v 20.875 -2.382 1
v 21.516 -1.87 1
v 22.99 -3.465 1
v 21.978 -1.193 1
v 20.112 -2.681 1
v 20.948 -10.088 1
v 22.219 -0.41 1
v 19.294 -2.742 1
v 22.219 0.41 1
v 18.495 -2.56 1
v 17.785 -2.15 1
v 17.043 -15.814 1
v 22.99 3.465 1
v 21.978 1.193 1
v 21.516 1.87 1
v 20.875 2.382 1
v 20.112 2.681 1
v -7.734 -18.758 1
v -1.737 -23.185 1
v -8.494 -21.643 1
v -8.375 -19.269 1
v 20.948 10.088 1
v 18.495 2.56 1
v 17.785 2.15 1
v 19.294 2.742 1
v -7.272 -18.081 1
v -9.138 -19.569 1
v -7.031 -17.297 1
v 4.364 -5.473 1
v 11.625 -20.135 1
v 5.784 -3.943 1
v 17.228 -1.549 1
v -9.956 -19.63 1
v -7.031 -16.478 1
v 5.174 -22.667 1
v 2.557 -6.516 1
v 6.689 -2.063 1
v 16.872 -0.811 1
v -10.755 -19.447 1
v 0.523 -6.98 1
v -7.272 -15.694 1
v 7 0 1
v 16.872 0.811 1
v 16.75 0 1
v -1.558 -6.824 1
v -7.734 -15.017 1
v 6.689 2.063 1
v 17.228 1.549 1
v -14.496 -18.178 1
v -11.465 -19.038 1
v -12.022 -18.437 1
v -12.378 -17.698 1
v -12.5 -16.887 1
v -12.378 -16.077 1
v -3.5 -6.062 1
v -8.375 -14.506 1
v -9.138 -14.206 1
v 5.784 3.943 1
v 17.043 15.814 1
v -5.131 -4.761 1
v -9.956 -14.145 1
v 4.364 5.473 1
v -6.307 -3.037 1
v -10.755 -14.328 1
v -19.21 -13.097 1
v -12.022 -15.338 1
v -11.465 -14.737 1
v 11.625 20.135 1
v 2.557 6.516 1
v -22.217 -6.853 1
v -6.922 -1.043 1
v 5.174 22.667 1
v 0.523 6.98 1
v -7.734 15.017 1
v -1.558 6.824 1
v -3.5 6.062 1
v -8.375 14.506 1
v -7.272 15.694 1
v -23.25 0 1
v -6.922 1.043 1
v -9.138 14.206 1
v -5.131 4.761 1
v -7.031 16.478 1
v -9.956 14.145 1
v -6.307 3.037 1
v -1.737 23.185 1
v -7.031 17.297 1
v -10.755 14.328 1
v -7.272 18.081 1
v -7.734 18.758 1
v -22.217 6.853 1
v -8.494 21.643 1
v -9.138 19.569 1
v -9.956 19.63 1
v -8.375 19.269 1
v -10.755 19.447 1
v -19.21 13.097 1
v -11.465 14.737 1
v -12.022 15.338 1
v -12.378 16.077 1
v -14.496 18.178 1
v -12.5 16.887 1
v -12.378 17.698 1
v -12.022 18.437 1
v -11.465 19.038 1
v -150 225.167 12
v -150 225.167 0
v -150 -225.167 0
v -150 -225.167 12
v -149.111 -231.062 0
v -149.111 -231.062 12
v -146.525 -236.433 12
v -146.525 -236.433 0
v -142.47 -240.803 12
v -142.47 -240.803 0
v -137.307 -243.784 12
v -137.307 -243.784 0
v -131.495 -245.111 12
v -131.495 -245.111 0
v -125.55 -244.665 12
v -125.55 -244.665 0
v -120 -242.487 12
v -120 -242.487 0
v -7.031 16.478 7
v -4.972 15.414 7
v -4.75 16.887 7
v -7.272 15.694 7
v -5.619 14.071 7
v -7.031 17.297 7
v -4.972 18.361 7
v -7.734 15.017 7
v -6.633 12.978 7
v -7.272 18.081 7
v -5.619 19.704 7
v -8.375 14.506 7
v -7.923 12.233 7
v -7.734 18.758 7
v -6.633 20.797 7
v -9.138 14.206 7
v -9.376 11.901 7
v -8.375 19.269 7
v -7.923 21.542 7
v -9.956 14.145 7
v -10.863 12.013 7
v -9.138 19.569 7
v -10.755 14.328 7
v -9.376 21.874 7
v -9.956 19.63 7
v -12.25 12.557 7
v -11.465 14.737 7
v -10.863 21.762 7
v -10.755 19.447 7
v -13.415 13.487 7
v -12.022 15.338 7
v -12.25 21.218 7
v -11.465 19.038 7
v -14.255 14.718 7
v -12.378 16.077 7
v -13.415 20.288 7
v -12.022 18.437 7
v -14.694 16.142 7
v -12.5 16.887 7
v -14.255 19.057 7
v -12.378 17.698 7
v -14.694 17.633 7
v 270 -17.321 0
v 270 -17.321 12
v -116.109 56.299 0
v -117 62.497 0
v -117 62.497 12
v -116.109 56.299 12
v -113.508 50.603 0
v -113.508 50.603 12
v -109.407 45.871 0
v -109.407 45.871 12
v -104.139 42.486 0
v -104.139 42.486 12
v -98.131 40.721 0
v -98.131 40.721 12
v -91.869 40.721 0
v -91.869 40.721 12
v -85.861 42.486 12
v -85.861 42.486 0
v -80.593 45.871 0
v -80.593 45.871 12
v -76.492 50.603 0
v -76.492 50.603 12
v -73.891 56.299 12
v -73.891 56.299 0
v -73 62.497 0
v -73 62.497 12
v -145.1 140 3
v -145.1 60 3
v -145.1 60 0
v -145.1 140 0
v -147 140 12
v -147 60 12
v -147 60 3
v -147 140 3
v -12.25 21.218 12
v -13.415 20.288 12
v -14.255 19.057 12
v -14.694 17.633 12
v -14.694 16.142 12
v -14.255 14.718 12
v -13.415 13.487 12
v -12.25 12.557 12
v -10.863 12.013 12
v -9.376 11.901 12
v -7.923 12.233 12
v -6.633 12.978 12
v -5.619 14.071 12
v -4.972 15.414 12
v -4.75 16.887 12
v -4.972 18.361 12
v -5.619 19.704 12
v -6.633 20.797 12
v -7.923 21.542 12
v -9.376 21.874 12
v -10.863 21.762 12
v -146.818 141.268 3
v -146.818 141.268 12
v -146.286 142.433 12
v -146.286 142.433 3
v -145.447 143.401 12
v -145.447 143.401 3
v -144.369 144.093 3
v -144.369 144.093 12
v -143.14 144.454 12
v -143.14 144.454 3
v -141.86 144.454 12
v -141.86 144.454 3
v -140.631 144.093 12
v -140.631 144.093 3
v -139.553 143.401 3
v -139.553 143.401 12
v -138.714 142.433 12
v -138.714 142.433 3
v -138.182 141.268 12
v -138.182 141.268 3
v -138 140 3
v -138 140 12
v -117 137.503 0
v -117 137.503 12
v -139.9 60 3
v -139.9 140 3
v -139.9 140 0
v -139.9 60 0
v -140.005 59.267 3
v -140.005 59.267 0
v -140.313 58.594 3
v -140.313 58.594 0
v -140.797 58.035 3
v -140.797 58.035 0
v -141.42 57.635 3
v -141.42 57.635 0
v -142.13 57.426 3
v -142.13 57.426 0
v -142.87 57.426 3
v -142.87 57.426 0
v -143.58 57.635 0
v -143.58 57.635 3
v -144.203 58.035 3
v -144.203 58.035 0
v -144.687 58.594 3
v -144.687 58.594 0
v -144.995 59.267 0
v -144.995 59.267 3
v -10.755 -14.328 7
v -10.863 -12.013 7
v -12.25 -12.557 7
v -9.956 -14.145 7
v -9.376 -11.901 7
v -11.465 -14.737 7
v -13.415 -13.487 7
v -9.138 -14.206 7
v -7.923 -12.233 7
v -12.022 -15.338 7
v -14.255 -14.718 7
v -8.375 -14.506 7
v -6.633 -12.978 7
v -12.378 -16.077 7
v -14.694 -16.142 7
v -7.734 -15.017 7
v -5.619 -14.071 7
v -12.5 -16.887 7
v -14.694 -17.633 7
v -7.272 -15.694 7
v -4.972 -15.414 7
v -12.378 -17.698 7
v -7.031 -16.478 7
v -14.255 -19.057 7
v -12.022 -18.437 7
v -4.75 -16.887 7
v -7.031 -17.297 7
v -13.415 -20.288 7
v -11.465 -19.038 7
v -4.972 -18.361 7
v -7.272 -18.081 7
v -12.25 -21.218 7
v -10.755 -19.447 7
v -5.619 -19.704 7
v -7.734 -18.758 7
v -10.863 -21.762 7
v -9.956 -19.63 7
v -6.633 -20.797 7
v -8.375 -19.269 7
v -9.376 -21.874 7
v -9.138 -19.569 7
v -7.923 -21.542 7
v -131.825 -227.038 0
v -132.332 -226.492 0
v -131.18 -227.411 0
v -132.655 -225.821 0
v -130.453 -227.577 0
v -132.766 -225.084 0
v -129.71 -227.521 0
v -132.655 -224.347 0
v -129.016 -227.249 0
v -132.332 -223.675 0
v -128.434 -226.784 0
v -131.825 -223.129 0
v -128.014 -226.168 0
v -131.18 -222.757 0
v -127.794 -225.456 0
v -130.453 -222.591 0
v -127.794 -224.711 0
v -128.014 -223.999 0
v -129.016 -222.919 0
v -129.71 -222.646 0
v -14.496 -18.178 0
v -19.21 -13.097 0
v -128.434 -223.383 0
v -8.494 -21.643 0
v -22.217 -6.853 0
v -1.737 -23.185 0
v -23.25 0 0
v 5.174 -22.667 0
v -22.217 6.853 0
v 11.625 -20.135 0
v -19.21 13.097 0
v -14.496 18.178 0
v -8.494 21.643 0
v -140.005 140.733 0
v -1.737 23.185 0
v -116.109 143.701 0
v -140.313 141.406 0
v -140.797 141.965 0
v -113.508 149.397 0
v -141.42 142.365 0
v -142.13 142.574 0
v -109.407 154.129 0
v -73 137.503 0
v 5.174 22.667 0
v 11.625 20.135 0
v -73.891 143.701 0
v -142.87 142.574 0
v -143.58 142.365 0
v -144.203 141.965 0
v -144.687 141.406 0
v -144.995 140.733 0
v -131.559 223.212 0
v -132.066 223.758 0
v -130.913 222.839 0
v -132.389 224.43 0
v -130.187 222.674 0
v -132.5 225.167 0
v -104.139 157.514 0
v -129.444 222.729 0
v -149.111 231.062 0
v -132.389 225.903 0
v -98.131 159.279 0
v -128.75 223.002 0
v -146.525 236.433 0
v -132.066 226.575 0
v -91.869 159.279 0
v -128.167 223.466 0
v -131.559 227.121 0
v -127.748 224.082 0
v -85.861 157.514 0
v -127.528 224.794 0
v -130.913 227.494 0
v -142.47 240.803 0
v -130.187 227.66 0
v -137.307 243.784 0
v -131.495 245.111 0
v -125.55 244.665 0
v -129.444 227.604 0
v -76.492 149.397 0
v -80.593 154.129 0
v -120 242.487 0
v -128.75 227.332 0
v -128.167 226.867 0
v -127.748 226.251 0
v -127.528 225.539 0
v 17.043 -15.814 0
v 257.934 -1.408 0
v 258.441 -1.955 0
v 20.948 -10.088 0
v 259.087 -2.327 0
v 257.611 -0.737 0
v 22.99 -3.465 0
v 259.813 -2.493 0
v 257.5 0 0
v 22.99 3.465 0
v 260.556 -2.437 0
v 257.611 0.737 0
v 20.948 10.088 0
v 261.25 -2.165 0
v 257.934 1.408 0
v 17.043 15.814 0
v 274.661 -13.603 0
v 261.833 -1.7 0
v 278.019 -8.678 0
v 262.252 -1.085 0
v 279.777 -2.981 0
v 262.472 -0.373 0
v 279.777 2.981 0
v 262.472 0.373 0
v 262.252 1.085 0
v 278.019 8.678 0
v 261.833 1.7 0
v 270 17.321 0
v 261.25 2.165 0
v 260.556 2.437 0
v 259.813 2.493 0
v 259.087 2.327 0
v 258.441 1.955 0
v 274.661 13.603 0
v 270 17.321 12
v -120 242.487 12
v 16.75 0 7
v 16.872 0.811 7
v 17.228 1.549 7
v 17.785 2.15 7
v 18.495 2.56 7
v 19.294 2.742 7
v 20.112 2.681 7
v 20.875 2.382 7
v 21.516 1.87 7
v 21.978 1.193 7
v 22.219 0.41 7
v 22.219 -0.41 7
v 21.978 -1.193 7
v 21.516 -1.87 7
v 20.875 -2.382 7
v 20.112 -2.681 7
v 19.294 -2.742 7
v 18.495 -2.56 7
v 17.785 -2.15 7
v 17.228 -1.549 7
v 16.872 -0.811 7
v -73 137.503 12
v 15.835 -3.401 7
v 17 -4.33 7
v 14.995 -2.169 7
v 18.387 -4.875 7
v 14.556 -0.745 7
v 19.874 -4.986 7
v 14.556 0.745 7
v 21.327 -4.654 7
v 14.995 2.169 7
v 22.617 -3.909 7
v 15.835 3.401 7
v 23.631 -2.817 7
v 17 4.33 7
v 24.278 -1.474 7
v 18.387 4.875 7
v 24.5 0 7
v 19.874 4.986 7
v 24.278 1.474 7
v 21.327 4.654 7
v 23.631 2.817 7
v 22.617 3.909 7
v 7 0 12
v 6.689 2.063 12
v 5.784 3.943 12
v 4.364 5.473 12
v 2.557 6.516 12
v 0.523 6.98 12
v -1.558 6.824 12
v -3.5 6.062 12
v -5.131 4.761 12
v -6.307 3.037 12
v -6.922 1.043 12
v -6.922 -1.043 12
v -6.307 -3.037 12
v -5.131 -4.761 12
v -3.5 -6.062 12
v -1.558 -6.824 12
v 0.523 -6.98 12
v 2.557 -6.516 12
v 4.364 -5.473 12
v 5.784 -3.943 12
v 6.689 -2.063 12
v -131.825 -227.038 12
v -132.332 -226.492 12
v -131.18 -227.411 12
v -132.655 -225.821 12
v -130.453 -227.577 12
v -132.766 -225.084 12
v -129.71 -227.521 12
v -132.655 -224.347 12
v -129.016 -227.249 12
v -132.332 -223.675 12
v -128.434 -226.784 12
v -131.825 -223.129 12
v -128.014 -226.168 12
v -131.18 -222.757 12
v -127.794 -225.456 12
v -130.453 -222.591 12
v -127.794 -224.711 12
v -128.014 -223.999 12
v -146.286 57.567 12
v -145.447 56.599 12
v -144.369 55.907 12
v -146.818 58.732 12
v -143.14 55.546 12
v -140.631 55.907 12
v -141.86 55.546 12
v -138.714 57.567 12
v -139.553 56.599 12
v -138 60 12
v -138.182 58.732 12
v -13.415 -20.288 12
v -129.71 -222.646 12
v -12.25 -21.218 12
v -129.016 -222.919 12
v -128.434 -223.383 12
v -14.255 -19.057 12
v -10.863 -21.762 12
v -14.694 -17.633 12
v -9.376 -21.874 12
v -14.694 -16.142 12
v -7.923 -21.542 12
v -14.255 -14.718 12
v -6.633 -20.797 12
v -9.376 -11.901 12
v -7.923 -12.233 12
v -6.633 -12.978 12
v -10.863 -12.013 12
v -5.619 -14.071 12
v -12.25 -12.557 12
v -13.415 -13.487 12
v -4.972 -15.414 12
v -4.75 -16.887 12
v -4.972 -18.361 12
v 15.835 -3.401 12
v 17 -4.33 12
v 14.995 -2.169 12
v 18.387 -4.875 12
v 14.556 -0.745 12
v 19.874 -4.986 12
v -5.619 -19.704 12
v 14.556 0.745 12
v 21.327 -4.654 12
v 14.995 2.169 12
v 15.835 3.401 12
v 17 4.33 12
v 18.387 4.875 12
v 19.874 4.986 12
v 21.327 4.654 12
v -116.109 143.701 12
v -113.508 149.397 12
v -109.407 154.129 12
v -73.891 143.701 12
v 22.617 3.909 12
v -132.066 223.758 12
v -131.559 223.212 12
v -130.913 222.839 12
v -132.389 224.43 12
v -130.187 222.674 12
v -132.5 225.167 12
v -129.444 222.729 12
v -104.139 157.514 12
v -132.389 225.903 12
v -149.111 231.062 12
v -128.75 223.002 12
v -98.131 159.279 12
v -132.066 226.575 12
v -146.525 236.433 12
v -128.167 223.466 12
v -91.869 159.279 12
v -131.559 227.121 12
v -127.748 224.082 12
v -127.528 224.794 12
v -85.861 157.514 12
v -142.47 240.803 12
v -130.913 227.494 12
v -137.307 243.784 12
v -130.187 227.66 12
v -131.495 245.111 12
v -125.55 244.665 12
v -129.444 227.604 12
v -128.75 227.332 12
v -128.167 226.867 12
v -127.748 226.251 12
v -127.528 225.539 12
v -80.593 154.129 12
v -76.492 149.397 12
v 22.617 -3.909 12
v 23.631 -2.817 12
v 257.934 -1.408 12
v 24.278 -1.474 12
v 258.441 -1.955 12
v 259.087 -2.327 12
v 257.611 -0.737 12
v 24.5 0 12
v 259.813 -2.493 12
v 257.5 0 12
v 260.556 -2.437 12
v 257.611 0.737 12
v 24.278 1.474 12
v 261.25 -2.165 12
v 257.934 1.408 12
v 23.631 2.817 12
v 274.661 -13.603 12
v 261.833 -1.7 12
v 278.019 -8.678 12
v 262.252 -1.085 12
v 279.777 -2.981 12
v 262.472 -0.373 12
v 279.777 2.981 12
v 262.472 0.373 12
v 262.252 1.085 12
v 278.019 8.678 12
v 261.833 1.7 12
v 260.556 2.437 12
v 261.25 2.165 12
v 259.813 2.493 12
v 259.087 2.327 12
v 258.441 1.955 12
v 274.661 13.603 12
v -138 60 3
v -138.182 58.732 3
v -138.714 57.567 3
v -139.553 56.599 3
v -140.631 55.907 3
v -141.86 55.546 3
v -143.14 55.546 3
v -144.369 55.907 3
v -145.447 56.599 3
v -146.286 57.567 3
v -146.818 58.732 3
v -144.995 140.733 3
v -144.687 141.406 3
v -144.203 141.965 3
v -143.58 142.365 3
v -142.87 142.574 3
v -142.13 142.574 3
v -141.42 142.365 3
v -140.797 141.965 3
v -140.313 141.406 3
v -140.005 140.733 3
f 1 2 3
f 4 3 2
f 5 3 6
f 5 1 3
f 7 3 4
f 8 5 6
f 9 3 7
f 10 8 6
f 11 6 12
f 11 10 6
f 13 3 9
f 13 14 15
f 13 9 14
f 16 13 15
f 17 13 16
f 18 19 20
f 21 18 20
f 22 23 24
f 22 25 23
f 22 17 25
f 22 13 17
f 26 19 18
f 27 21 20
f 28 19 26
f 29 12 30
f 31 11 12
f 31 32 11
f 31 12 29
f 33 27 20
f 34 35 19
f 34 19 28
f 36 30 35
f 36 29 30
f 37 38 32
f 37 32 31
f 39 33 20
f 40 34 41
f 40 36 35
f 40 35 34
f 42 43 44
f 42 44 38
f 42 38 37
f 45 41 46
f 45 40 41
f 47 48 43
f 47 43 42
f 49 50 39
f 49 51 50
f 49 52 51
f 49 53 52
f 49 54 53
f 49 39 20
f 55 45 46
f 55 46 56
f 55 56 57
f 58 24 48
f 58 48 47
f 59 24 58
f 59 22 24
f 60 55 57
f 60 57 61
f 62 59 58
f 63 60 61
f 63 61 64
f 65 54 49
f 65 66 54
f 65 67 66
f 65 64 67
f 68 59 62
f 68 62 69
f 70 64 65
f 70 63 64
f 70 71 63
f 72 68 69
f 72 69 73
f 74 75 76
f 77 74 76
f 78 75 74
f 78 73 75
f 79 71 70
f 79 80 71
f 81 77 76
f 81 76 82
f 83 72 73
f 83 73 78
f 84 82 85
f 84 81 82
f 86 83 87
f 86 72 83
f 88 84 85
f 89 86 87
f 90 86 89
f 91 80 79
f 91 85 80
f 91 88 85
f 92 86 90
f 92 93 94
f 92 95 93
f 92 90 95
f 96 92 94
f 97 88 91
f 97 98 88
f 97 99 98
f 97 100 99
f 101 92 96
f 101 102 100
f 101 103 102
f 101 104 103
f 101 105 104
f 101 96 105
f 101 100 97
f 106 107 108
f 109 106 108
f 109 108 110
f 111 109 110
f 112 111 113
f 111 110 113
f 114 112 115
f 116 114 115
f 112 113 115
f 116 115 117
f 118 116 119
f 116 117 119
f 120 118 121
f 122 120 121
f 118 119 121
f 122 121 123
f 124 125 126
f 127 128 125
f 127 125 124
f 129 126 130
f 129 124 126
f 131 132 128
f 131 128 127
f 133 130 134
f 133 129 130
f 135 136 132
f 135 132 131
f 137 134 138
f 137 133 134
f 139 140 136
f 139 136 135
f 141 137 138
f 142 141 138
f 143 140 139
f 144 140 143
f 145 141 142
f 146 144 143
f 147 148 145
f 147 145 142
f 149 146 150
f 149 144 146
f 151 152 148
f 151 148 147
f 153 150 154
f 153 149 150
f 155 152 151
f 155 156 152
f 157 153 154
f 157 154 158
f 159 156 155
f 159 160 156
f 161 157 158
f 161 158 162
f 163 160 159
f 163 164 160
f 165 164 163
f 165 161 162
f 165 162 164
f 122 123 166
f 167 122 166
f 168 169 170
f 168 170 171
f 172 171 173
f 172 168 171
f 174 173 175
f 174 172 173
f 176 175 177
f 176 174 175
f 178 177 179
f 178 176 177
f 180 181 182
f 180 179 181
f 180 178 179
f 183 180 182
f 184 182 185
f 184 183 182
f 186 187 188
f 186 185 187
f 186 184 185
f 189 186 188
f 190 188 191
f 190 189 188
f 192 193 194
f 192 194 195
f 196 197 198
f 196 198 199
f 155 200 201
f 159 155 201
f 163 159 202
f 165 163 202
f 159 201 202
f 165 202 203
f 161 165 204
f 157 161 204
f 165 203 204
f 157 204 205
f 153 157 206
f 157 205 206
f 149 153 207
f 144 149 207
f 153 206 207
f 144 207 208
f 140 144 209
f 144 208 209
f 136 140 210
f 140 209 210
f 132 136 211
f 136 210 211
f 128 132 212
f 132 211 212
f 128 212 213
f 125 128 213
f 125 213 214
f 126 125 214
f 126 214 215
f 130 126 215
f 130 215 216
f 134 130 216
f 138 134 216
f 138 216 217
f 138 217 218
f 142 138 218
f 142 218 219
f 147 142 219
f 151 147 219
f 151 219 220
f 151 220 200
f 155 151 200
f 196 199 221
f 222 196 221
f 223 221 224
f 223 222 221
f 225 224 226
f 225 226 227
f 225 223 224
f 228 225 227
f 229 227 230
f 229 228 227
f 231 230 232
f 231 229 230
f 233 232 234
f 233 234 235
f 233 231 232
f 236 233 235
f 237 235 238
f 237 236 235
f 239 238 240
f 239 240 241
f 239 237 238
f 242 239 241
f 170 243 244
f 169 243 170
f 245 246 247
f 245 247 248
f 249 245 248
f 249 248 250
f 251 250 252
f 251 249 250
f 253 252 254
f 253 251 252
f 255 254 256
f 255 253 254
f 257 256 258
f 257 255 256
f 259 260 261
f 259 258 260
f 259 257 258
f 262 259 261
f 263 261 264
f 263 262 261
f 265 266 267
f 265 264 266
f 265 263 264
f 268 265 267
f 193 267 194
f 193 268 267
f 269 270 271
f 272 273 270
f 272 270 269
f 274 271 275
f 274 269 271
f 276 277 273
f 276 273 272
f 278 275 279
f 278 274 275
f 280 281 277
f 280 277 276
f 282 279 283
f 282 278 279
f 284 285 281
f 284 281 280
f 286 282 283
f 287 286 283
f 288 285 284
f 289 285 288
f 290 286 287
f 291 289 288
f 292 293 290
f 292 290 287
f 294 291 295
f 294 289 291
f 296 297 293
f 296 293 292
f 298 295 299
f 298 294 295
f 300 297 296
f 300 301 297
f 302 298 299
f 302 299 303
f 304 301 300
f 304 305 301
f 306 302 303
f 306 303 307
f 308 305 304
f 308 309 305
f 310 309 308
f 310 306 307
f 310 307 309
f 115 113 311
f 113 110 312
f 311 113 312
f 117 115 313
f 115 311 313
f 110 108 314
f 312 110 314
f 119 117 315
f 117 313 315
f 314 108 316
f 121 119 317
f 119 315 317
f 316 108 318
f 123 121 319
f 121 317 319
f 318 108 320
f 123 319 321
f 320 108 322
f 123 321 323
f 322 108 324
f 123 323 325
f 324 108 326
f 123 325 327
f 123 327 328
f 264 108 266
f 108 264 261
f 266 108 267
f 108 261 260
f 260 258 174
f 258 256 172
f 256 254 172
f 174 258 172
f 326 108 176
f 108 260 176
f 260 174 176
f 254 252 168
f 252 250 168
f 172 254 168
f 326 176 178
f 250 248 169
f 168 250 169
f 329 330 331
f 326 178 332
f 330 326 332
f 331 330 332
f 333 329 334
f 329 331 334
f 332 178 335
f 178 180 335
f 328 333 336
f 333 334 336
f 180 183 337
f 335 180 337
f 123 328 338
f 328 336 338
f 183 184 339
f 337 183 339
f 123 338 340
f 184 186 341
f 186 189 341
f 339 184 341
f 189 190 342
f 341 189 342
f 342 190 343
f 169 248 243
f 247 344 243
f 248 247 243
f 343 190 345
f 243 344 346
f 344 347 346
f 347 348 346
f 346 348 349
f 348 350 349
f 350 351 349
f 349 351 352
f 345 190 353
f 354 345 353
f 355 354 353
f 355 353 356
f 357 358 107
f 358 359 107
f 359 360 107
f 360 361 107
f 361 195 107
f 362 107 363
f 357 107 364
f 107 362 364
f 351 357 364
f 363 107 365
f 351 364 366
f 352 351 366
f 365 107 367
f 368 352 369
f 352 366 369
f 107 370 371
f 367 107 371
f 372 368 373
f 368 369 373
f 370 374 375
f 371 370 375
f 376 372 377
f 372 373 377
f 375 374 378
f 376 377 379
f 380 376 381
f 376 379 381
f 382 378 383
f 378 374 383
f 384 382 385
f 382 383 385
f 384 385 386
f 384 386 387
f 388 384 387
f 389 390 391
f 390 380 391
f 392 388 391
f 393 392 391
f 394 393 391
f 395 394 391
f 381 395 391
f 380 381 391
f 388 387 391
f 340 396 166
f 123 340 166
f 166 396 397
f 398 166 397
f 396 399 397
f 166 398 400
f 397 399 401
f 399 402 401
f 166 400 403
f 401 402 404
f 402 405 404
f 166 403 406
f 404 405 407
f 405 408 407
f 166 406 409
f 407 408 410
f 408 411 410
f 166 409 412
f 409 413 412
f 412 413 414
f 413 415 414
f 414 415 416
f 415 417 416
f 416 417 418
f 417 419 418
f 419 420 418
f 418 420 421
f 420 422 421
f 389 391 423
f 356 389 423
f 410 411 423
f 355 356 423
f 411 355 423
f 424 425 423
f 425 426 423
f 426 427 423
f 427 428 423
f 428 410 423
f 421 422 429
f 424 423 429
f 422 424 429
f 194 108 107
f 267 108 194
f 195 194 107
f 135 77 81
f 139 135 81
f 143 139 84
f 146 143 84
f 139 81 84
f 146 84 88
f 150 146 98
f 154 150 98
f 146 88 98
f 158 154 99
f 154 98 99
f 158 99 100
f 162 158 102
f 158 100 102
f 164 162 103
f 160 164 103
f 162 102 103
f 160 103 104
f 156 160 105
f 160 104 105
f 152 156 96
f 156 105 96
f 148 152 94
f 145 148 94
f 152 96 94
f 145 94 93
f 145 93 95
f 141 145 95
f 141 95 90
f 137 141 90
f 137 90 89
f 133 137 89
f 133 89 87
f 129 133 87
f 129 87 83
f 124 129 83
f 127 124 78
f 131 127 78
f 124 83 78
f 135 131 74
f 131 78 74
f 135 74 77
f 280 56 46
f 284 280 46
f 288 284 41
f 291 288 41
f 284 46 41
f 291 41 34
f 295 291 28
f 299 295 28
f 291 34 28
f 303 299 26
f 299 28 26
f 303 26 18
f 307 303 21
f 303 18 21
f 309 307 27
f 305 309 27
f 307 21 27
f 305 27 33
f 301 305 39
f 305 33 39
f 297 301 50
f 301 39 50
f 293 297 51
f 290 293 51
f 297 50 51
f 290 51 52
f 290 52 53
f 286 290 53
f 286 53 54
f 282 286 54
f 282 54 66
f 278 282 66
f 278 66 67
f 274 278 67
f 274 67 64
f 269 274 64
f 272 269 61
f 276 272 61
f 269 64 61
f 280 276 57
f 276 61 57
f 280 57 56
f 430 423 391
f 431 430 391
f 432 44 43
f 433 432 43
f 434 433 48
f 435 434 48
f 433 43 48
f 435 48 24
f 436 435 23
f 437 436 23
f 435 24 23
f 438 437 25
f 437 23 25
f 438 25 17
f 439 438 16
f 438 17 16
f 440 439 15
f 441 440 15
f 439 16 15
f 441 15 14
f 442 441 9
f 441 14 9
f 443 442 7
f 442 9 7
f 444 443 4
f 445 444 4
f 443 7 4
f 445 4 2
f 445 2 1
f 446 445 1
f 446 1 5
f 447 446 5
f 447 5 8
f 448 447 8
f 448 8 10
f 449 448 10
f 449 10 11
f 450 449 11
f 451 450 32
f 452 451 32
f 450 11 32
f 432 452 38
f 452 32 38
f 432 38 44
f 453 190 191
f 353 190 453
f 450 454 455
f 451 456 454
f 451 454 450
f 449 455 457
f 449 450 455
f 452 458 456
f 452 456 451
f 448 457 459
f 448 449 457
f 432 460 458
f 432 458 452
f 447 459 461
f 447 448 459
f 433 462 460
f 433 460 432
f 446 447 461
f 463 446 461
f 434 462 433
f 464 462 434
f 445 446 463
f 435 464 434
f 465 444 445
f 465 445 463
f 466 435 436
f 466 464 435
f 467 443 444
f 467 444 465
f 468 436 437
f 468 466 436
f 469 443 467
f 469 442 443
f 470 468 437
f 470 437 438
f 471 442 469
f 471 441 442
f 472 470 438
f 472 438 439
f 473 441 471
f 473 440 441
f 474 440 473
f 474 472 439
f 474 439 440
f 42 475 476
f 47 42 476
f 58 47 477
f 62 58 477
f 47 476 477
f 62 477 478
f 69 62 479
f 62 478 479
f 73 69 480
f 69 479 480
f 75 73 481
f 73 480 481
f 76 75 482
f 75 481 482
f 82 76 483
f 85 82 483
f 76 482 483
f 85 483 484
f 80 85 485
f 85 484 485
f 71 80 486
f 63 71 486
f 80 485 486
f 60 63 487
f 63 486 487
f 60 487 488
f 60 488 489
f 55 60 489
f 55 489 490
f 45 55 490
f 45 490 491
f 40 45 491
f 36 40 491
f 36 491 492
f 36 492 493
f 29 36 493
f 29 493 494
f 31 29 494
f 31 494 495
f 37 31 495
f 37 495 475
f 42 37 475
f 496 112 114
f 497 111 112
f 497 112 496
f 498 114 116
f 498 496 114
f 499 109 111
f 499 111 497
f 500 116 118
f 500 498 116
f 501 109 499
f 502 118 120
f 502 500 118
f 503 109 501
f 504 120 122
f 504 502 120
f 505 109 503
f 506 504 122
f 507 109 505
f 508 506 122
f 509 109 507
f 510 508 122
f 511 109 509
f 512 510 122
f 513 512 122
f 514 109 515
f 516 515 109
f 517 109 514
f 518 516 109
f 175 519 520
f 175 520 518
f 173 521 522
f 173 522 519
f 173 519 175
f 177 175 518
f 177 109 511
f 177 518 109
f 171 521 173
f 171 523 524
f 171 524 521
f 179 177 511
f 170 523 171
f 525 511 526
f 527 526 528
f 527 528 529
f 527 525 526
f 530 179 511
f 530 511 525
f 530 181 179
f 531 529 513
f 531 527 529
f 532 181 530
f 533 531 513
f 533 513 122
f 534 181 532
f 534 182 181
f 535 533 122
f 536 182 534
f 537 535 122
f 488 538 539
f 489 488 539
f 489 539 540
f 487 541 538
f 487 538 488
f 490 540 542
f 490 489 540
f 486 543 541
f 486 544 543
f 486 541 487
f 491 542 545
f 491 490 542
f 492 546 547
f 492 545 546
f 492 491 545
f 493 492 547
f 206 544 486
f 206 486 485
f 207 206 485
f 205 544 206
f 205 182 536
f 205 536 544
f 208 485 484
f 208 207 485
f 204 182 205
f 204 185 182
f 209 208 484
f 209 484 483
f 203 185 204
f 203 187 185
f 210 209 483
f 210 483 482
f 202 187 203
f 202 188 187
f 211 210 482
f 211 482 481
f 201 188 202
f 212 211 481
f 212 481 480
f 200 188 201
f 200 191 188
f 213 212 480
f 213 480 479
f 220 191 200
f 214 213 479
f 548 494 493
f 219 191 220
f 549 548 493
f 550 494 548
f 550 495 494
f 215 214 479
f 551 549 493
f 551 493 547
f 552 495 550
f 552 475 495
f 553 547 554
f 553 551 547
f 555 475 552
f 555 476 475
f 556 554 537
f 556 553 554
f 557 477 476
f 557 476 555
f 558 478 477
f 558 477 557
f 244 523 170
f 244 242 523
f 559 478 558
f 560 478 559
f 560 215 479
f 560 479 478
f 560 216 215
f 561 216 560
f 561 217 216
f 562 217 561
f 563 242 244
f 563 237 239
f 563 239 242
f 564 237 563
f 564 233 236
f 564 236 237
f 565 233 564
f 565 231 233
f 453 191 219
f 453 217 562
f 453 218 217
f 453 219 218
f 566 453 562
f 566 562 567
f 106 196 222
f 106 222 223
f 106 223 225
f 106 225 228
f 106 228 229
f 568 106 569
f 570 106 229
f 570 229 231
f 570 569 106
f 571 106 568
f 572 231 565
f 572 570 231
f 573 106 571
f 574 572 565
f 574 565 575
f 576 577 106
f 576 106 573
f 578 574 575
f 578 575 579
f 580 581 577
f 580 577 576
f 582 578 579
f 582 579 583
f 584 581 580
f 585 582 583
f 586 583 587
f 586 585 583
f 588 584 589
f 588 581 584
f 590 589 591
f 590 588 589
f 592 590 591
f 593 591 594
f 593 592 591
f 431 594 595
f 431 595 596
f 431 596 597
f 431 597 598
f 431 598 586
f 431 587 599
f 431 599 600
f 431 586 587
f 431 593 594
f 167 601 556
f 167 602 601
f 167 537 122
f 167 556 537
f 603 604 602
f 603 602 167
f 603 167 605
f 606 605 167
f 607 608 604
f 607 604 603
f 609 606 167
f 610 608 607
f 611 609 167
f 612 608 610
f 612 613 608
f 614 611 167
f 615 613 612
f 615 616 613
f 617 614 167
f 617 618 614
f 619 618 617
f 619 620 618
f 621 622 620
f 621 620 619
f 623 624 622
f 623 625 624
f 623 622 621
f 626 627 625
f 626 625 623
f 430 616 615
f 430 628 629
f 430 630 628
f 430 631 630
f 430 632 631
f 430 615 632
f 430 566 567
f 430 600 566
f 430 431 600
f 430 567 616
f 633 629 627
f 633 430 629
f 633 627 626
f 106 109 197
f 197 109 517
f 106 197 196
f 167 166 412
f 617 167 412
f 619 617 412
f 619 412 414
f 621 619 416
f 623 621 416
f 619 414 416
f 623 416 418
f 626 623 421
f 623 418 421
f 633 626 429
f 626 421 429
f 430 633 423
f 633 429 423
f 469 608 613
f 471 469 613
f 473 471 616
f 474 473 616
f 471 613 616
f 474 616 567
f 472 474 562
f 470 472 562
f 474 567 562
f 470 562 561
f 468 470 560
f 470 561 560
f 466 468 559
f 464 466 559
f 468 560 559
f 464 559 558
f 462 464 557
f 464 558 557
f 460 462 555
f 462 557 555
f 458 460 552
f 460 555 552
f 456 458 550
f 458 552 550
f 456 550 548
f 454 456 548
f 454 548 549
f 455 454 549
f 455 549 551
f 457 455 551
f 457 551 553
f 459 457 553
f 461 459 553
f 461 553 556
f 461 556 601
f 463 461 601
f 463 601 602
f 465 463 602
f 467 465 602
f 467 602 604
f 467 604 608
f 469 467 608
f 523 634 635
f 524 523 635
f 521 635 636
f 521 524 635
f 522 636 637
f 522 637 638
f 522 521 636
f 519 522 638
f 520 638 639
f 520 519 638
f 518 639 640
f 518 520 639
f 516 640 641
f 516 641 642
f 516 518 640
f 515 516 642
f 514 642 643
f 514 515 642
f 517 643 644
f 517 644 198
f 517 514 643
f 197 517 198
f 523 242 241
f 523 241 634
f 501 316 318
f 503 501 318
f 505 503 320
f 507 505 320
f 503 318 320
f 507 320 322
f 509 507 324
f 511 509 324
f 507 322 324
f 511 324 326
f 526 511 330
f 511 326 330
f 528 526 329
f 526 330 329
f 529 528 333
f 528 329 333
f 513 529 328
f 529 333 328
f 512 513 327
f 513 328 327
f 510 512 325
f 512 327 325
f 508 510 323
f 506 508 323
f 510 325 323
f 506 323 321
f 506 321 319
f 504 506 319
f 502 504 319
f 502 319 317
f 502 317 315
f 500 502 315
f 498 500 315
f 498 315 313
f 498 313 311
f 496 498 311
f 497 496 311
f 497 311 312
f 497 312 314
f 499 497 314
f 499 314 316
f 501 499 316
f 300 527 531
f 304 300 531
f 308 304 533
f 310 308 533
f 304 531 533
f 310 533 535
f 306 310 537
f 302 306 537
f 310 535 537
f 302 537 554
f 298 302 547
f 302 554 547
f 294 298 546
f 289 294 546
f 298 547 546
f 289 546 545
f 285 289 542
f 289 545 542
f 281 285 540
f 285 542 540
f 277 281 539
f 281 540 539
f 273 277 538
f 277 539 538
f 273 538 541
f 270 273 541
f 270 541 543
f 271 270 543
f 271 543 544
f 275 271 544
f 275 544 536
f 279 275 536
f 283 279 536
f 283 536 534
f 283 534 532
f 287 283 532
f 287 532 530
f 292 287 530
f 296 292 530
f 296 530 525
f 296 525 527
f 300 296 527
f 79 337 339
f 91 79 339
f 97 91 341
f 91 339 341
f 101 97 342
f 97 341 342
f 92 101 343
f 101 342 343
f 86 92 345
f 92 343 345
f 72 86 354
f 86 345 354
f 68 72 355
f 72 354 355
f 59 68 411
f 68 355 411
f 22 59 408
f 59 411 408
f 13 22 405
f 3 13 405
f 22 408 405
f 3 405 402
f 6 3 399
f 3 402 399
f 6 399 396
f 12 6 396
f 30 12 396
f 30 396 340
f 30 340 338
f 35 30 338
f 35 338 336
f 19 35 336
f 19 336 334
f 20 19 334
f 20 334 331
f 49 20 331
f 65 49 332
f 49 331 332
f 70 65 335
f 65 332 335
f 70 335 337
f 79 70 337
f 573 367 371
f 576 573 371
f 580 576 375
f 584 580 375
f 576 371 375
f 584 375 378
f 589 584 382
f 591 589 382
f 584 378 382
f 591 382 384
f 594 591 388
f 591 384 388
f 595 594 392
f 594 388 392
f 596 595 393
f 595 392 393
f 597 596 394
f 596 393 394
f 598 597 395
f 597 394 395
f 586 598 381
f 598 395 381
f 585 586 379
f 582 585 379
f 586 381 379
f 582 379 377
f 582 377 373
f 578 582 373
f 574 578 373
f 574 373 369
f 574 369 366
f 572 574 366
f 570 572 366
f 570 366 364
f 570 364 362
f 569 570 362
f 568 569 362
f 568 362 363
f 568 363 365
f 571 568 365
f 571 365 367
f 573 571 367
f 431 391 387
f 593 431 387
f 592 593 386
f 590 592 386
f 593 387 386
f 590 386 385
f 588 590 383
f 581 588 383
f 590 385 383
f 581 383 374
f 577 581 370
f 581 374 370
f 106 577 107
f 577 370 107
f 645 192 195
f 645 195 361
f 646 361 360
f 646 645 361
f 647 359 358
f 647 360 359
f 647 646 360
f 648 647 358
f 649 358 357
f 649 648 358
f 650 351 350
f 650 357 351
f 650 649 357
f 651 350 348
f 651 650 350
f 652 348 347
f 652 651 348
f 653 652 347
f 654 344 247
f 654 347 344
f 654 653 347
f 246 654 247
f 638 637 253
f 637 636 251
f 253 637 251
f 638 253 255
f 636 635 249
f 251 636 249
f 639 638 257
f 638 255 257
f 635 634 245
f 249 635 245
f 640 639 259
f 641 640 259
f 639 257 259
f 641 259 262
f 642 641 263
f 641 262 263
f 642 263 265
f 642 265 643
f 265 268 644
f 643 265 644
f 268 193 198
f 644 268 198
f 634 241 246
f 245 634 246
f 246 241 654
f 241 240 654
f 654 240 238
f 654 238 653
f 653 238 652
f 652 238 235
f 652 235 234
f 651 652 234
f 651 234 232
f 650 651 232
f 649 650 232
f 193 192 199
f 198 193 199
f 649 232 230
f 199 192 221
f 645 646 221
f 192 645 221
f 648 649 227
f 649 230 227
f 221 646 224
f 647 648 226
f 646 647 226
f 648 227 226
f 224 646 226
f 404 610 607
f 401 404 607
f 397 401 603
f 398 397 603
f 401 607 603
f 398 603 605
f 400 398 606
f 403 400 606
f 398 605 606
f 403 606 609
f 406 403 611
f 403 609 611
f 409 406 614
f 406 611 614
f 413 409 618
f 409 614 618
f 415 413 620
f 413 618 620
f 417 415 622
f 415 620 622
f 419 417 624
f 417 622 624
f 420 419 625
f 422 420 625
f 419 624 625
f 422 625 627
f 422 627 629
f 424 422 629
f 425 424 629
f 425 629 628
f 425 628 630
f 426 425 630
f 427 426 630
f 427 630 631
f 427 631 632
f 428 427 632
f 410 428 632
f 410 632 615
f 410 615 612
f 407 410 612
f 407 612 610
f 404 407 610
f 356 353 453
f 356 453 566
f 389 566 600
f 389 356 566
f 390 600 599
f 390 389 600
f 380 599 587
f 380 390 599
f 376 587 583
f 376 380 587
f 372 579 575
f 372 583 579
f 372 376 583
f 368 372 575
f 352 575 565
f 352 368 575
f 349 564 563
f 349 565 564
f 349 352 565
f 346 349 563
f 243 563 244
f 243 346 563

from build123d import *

# Parameters (mm, degrees)
BOSS_EXTRU_1_DEPTH                                 = 12
TROU_TARAUD_M61_D                                  = 5
TROU_TARAUD_M62_D                                  = 5
CHAMBRAGE_POUR_VIS_T_TE_HEXAGONALE_M51_D           = 5.5
CHAMBRAGE_POUR_VIS_T_TE_HEXAGONALE_M51_CBORE_D     = 10
CHAMBRAGE_POUR_VIS_T_TE_HEXAGONALE_M51_CBORE_DEPTH = 5
ESQUISSE11_R                                       = 7
ENL_V_MAT_EXTRU_1_DEPTH                            = 13
R_P_TITION_CIRCULAIRE1_COUNT                       = 3
ESQUISSE12_R                                       = 23.25
ENL_V_MAT_EXTRU_2_DEPTH                            = 1
ENL_V_MAT_EXTRU_4_DEPTH                            = 13
ENL_V_MAT_EXTRU_5_DEPTH                            = 13
ENL_V_MAT_EXTRU_6_DEPTH                            = 9


with BuildPart() as part:
    # Esquisse1 → Boss.-Extru.1 (new body)
    with BuildSketch(Plane.XY):
        with BuildLine():
            Line((270, 17.320508076), (-120, 242.48711306))
            ThreePointArc((-120, 242.48711306), (-140, 242.48711306), (-150, 225.166604984))
            Line((-150, 225.166604984), (-150, -225.166604984))
            ThreePointArc((-150, -225.166604984), (-140, -242.48711306), (-120, -242.48711306))
            Line((-120, -242.48711306), (270, -17.320508076))
            ThreePointArc((270, -17.320508076), (280, 0), (270, 17.320508076))
        make_face()
    extrude(amount=BOSS_EXTRU_1_DEPTH)

    # Trou taraudé M61 (through all)
    with Locations(Plane(origin=(0, 0, 0), x_dir=(1, 0, 0), z_dir=(0, 0, -1))):
        with Locations((260, 0)):
            Hole(TROU_TARAUD_M61_D / 2)

    # Trou taraudé M62 (through all)
    with Locations(Plane.XY.offset(12)):
        with Locations((-130.266309147, -225.083745367), (-130, 225.166604984)):
            Hole(TROU_TARAUD_M62_D / 2)

    # Chambrage pour vis à tête hexagonale M51 (through all)
    with Locations(Plane.XY.offset(12)):
        with Locations((19.5, 0)):
            chambrage_pour_vis_t_te_hexagonale_m51 = CounterBoreHole(CHAMBRAGE_POUR_VIS_T_TE_HEXAGONALE_M51_D / 2, CHAMBRAGE_POUR_VIS_T_TE_HEXAGONALE_M51_CBORE_D / 2, CHAMBRAGE_POUR_VIS_T_TE_HEXAGONALE_M51_CBORE_DEPTH)

    # Esquisse11 → Enlèv. mat.-Extru.1 (cut, through all)
    with BuildSketch(Plane.XY.offset(12)):
        Circle(ESQUISSE11_R)
    extrude(amount=-ENL_V_MAT_EXTRU_1_DEPTH, mode=Mode.SUBTRACT)

    # Répétition circulaire1: Chambrage pour vis à tête hexagonale M51 ×3 about axis
    r_p_tition_circulaire1_axis = Axis((0, 0, 0), (0, 0, 1))
    for i in range(1, R_P_TITION_CIRCULAIRE1_COUNT):
        add(chambrage_pour_vis_t_te_hexagonale_m51.rotate(r_p_tition_circulaire1_axis, i * 360 / R_P_TITION_CIRCULAIRE1_COUNT), mode=Mode.SUBTRACT)

    # Esquisse12 → Enlèv. mat.-Extru.2 (cut)
    with BuildSketch(Plane(origin=(0, 0, 0), x_dir=(-1, 0, 0), z_dir=(0, 0, -1))):
        Circle(ESQUISSE12_R)
    extrude(amount=-ENL_V_MAT_EXTRU_2_DEPTH, mode=Mode.SUBTRACT)

    # Esquisse15 → Enlèv. mat.-Extru.4 (cut, through all)
    with BuildSketch(Plane(origin=(0, 0, 0), x_dir=(-1, 0, 0), z_dir=(0, 0, -1))):
        with BuildLine():
            Line((117, 137.502524439), (117, 62.497475561))
            ThreePointArc((117, 62.497475561), (95, 40.497475561), (73, 62.497475561))
            Line((73, 62.497475561), (73, 137.502524439))
            ThreePointArc((73, 137.502524439), (95, 159.502524439), (117, 137.502524439))
        make_face()
    extrude(amount=-ENL_V_MAT_EXTRU_4_DEPTH, mode=Mode.SUBTRACT)

    # Esquisse16 → Enlèv. mat.-Extru.5 (cut, through all)
    with BuildSketch(Plane.XY.offset(12)):
        with BuildLine():
            Line((-139.9, 140), (-139.9, 60))
            ThreePointArc((-139.9, 60), (-142.5, 57.4), (-145.1, 60))
            Line((-145.1, 60), (-145.1, 140))
            ThreePointArc((-145.1, 140), (-142.5, 142.6), (-139.9, 140))
        make_face()
    extrude(amount=-ENL_V_MAT_EXTRU_5_DEPTH, mode=Mode.SUBTRACT)

    # Esquisse17 → Enlèv. mat.-Extru.6 (cut)
    with BuildSketch(Plane.XY.offset(12)):
        with BuildLine():
            Line((-138, 140), (-138, 60))
            ThreePointArc((-138, 60), (-142.5, 55.5), (-147, 60))
            Line((-147, 60), (-147, 140))
            ThreePointArc((-147, 140), (-142.5, 144.5), (-138, 140))
        make_face()
    extrude(amount=-ENL_V_MAT_EXTRU_6_DEPTH, mode=Mode.SUBTRACT)


solid = part.part
